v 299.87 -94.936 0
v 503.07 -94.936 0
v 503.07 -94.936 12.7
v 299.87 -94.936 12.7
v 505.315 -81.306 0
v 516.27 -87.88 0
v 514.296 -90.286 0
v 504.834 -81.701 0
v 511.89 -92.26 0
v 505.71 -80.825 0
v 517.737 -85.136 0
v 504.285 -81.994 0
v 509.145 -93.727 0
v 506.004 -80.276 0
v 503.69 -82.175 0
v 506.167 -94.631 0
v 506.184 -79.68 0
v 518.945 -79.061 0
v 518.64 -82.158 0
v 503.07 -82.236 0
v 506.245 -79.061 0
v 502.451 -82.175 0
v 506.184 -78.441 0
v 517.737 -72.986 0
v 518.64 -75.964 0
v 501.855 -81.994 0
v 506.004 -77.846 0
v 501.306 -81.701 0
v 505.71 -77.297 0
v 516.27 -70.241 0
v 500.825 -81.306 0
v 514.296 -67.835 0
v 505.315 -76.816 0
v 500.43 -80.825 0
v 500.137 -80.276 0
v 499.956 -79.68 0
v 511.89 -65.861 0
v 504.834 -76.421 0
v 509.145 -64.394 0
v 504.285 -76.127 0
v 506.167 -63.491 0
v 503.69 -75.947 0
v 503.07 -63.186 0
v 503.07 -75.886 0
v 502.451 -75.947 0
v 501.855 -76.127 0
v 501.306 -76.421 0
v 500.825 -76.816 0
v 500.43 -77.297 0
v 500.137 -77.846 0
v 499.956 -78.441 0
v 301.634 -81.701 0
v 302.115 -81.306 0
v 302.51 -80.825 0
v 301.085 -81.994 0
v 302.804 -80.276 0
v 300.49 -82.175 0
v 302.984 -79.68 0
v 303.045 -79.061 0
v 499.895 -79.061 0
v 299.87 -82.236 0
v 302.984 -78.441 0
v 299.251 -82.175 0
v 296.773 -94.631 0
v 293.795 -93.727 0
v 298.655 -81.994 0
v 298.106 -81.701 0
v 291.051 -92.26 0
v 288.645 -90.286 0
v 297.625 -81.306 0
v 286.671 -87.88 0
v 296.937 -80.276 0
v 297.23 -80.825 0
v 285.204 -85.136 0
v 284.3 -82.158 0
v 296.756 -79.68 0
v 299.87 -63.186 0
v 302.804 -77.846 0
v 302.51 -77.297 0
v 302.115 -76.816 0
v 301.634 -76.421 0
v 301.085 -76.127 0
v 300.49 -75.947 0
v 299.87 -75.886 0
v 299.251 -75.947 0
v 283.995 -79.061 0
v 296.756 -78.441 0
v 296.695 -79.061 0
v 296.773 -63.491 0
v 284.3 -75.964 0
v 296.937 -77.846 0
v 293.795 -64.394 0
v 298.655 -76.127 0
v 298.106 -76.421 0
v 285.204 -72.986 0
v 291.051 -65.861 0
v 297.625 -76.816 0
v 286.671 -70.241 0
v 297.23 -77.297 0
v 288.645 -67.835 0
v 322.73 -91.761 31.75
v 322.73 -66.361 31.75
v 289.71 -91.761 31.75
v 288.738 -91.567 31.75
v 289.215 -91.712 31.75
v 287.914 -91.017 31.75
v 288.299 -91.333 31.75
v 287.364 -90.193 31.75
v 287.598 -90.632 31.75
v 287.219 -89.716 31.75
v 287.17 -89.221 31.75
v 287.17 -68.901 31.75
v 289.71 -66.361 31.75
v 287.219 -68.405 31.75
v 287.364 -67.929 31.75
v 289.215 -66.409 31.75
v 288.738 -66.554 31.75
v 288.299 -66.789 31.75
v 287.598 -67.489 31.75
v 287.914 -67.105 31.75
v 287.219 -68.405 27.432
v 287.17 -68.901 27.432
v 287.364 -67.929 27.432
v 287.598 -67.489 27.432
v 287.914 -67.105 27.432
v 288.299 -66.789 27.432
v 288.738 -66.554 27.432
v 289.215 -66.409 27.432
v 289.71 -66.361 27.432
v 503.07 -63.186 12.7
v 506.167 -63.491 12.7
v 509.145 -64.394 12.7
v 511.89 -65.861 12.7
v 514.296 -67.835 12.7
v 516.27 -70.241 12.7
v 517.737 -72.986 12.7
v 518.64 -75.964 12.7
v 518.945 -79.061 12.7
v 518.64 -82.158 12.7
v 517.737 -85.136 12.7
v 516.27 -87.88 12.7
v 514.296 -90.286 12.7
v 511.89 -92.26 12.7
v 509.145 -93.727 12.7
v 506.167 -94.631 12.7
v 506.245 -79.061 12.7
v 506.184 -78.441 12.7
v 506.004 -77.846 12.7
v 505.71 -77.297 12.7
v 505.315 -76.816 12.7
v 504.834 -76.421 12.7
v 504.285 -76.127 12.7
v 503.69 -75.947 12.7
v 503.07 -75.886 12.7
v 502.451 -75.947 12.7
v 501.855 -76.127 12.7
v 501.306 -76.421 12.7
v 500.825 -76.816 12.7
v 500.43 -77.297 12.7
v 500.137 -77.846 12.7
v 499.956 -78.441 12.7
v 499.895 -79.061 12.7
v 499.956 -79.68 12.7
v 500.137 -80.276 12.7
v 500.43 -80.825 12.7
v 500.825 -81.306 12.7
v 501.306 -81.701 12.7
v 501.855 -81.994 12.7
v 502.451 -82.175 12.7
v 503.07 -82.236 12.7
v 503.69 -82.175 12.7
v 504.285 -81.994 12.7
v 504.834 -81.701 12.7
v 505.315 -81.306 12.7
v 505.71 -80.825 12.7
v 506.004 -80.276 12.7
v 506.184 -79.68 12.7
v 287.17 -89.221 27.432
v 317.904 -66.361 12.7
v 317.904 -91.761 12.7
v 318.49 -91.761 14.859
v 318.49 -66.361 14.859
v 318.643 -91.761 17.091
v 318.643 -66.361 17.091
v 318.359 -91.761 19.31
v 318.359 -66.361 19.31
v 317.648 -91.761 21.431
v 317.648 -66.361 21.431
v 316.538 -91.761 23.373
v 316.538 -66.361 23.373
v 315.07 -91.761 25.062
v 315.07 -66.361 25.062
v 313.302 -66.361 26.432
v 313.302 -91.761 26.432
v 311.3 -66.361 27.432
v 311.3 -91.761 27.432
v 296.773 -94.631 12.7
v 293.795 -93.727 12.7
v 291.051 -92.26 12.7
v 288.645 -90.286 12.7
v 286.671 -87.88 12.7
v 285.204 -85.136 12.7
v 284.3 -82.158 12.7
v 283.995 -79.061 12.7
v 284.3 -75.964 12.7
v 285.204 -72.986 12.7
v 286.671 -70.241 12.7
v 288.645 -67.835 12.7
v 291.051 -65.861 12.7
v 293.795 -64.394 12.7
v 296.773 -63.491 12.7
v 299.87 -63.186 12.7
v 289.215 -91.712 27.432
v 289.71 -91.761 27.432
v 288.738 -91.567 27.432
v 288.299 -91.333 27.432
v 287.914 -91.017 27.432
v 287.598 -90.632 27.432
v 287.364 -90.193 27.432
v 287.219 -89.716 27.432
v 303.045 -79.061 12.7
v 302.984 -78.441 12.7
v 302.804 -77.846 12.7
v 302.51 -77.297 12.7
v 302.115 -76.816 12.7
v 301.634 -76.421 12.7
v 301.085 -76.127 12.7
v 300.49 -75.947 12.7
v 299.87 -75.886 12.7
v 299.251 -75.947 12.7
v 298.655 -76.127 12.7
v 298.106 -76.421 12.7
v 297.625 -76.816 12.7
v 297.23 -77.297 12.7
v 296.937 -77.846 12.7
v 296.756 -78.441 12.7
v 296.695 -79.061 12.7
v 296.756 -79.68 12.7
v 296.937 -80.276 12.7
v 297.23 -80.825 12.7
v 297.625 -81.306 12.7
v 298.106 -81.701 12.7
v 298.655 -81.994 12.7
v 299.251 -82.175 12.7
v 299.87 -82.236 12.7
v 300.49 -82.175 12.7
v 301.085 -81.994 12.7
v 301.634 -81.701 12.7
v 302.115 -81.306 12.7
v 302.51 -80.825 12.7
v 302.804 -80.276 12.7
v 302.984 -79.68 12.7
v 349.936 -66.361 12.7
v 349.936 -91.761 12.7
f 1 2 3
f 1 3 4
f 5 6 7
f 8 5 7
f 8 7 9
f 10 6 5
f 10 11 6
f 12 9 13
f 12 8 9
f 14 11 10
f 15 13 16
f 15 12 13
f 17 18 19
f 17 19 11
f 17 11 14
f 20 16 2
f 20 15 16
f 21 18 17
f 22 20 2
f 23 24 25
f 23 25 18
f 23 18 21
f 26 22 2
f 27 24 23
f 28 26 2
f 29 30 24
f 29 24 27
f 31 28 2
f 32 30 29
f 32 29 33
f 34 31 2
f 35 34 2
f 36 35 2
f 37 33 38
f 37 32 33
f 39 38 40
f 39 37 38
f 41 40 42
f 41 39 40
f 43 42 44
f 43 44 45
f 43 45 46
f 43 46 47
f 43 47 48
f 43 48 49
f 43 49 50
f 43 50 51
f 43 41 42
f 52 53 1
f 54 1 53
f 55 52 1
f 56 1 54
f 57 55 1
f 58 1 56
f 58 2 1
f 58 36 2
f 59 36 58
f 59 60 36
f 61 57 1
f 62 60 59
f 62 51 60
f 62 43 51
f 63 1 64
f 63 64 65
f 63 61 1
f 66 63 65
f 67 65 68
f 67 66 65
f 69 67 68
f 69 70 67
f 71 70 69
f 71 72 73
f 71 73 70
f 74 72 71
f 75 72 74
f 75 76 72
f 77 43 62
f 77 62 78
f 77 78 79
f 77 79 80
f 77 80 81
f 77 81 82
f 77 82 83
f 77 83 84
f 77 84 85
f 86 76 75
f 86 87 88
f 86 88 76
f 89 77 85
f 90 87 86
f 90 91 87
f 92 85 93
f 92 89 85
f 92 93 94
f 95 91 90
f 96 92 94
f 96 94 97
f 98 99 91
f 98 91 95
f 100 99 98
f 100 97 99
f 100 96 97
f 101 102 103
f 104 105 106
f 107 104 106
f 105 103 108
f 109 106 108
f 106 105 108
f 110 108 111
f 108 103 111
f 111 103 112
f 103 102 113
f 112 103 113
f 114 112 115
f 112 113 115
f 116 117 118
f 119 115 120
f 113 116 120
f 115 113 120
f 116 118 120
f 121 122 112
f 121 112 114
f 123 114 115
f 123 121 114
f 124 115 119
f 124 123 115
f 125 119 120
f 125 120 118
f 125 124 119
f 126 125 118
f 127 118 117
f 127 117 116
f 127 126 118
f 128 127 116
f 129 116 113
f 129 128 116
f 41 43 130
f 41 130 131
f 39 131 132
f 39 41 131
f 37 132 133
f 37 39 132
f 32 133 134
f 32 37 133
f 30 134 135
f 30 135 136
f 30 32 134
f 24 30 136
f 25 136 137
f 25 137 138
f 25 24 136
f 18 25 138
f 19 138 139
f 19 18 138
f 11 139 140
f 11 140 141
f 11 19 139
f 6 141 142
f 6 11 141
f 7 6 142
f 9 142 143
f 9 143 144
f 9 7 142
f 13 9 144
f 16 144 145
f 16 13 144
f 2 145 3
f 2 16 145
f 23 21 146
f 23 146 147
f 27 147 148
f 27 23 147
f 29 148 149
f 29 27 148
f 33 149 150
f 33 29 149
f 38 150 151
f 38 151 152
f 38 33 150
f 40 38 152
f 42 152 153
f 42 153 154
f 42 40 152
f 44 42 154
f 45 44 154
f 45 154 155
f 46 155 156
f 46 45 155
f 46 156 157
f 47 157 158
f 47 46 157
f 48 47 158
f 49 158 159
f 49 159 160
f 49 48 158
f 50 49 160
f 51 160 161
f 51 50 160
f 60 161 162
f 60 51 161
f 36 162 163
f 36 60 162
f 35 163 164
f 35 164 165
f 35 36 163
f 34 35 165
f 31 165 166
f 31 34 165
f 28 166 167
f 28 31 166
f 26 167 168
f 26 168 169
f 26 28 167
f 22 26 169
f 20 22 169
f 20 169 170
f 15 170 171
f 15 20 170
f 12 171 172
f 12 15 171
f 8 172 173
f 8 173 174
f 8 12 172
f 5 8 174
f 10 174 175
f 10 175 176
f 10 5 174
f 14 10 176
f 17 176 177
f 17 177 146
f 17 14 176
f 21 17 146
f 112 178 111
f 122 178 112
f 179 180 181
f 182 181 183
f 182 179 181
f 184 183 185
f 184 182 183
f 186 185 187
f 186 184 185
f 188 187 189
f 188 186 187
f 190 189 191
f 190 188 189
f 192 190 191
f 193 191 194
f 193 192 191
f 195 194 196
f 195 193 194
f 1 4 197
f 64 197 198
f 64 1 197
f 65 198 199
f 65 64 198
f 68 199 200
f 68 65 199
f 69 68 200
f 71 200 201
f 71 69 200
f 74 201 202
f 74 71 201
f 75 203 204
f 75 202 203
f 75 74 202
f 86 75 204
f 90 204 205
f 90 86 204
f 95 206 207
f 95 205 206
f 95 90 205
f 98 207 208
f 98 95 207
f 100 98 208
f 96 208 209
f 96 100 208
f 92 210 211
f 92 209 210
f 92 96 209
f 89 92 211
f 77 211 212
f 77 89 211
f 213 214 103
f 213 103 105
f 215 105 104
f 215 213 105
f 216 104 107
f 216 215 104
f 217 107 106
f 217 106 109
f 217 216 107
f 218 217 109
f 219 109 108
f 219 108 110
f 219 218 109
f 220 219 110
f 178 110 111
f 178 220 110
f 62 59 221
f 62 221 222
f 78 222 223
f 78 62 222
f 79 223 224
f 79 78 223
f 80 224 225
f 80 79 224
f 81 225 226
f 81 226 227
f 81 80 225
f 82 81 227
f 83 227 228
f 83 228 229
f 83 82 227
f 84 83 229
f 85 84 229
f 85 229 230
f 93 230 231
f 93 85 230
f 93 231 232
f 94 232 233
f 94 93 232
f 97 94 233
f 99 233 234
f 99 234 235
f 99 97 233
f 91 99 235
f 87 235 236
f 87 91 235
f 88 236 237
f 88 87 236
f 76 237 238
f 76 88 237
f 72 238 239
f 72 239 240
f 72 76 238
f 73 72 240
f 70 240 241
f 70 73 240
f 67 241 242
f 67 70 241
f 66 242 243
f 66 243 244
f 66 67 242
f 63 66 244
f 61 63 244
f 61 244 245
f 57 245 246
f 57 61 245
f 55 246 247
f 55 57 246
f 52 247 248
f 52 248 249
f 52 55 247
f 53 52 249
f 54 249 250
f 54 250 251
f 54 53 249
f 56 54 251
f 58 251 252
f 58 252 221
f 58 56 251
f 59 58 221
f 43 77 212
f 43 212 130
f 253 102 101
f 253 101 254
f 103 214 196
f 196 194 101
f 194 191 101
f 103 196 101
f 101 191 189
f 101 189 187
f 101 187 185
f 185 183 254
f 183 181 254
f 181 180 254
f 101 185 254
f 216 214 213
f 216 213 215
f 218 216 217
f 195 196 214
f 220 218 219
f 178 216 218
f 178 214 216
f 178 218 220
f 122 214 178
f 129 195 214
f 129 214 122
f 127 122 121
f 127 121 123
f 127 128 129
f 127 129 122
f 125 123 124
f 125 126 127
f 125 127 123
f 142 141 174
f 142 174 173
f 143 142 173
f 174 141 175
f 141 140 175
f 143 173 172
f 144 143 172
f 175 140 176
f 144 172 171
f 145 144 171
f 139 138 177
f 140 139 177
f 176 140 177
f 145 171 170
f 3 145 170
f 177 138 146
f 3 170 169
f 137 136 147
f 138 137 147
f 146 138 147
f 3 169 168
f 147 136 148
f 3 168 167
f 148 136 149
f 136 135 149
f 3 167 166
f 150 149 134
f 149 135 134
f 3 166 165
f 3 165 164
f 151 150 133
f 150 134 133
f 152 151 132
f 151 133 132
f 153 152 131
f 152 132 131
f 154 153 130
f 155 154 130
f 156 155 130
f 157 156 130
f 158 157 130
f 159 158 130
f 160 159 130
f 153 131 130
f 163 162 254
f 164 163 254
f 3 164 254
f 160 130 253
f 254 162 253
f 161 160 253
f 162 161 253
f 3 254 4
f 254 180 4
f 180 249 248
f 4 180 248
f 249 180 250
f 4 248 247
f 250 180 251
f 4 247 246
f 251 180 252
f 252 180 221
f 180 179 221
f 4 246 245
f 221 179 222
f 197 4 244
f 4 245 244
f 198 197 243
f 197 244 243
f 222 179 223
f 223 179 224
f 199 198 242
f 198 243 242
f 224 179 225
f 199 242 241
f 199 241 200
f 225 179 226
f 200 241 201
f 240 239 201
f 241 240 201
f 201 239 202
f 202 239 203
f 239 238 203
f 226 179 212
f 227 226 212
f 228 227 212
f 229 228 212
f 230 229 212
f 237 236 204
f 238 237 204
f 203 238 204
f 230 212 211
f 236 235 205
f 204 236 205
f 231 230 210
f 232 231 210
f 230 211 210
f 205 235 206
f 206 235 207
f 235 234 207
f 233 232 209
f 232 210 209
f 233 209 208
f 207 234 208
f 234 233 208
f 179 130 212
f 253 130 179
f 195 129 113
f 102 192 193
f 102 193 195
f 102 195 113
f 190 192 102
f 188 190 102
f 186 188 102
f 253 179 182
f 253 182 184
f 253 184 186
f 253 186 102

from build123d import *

# Parameters (mm, degrees)
SKETCH1_R           = 3.175
BOSS_EXTRUDE1_DEPTH = 12.7
BOSS_EXTRUDE8_DEPTH = 19.05
CUT_EXTRUDE3_DEPTH  = 41.148
BOSS_EXTRUDE9_DEPTH = 25.4


with BuildPart() as part:
    # Sketch1 → Boss-Extrude1 (new body)
    with BuildSketch(Plane.XY):
        with BuildLine():
            Line((299.870251741, -63.185614448), (503.070251741, -63.185614448))
            ThreePointArc((503.070251741, -63.185614448), (518.945251741, -79.060614448), (503.070251741, -94.935614448))
            Line((503.070251741, -94.935614448), (299.870251741, -94.935614448))
            ThreePointArc((299.870251741, -94.935614448), (283.995251741, -79.060614448), (299.870251741, -63.185614448))
        make_face()
        with Locations((299.870251741, -79.060614448)):
            Circle(SKETCH1_R, mode=Mode.SUBTRACT)
        with Locations((503.070251741, -79.060614448)):
            Circle(SKETCH1_R, mode=Mode.SUBTRACT)
    extrude(amount=BOSS_EXTRUDE1_DEPTH)

    # Sketch7 → Boss-Extrude8 (add)
    with BuildSketch(Plane.XY.offset(12.7)):
        with BuildLine():
            Line((310.030251741, -66.360614448), (312.570251741, -66.360614448))
            Line((312.570251741, -66.360614448), (322.730251741, -66.360614448))
            Line((322.730251741, -66.360614448), (322.730251741, -91.760614448))
            Line((322.730251741, -91.760614448), (310.030251741, -91.760614448))
            Line((310.030251741, -91.760614448), (289.710251741, -91.760614448))
            ThreePointArc((289.710251741, -91.760614448), (287.914200517, -91.016665672), (287.170251741, -89.220614448))
            Line((287.170251741, -89.220614448), (287.170251741, -68.900614448))
            ThreePointArc((287.170251741, -68.900614448), (287.914200517, -67.104563223), (289.710251741, -66.360614448))
            Line((289.710251741, -66.360614448), (310.030251741, -66.360614448))
        make_face()
    extrude(amount=BOSS_EXTRUDE8_DEPTH)

    # Sketch8 → Cut-Extrude3 (cut)
    with BuildSketch(Plane(origin=(0, -66.360614448, 0), x_dir=(1, 0, 0), z_dir=(0, 1, 0))):
        with BuildLine():
            Line((287.170251741, -12.7), (317.904251741, -12.7))
            ThreePointArc((317.904251741, -12.7), (317.648023156, -21.431345807), (311.300251741, -27.432))
            Line((311.300251741, -27.432), (287.170251741, -27.432))
            Line((287.170251741, -27.432), (287.170251741, -12.7))
        make_face()
    extrude(amount=-CUT_EXTRUDE3_DEPTH, mode=Mode.SUBTRACT)

    # Sketch9 → Boss-Extrude9 (add)
    with BuildSketch(Plane(origin=(0, -66.360614448, 0), x_dir=(1, 0, 0), z_dir=(0, 1, 0))):
        Polygon((322.730251741, -31.75), (349.936471269, -12.7), (322.730251741, -12.7), align=None)
    extrude(amount=-BOSS_EXTRUDE9_DEPTH)


solid = part.part
